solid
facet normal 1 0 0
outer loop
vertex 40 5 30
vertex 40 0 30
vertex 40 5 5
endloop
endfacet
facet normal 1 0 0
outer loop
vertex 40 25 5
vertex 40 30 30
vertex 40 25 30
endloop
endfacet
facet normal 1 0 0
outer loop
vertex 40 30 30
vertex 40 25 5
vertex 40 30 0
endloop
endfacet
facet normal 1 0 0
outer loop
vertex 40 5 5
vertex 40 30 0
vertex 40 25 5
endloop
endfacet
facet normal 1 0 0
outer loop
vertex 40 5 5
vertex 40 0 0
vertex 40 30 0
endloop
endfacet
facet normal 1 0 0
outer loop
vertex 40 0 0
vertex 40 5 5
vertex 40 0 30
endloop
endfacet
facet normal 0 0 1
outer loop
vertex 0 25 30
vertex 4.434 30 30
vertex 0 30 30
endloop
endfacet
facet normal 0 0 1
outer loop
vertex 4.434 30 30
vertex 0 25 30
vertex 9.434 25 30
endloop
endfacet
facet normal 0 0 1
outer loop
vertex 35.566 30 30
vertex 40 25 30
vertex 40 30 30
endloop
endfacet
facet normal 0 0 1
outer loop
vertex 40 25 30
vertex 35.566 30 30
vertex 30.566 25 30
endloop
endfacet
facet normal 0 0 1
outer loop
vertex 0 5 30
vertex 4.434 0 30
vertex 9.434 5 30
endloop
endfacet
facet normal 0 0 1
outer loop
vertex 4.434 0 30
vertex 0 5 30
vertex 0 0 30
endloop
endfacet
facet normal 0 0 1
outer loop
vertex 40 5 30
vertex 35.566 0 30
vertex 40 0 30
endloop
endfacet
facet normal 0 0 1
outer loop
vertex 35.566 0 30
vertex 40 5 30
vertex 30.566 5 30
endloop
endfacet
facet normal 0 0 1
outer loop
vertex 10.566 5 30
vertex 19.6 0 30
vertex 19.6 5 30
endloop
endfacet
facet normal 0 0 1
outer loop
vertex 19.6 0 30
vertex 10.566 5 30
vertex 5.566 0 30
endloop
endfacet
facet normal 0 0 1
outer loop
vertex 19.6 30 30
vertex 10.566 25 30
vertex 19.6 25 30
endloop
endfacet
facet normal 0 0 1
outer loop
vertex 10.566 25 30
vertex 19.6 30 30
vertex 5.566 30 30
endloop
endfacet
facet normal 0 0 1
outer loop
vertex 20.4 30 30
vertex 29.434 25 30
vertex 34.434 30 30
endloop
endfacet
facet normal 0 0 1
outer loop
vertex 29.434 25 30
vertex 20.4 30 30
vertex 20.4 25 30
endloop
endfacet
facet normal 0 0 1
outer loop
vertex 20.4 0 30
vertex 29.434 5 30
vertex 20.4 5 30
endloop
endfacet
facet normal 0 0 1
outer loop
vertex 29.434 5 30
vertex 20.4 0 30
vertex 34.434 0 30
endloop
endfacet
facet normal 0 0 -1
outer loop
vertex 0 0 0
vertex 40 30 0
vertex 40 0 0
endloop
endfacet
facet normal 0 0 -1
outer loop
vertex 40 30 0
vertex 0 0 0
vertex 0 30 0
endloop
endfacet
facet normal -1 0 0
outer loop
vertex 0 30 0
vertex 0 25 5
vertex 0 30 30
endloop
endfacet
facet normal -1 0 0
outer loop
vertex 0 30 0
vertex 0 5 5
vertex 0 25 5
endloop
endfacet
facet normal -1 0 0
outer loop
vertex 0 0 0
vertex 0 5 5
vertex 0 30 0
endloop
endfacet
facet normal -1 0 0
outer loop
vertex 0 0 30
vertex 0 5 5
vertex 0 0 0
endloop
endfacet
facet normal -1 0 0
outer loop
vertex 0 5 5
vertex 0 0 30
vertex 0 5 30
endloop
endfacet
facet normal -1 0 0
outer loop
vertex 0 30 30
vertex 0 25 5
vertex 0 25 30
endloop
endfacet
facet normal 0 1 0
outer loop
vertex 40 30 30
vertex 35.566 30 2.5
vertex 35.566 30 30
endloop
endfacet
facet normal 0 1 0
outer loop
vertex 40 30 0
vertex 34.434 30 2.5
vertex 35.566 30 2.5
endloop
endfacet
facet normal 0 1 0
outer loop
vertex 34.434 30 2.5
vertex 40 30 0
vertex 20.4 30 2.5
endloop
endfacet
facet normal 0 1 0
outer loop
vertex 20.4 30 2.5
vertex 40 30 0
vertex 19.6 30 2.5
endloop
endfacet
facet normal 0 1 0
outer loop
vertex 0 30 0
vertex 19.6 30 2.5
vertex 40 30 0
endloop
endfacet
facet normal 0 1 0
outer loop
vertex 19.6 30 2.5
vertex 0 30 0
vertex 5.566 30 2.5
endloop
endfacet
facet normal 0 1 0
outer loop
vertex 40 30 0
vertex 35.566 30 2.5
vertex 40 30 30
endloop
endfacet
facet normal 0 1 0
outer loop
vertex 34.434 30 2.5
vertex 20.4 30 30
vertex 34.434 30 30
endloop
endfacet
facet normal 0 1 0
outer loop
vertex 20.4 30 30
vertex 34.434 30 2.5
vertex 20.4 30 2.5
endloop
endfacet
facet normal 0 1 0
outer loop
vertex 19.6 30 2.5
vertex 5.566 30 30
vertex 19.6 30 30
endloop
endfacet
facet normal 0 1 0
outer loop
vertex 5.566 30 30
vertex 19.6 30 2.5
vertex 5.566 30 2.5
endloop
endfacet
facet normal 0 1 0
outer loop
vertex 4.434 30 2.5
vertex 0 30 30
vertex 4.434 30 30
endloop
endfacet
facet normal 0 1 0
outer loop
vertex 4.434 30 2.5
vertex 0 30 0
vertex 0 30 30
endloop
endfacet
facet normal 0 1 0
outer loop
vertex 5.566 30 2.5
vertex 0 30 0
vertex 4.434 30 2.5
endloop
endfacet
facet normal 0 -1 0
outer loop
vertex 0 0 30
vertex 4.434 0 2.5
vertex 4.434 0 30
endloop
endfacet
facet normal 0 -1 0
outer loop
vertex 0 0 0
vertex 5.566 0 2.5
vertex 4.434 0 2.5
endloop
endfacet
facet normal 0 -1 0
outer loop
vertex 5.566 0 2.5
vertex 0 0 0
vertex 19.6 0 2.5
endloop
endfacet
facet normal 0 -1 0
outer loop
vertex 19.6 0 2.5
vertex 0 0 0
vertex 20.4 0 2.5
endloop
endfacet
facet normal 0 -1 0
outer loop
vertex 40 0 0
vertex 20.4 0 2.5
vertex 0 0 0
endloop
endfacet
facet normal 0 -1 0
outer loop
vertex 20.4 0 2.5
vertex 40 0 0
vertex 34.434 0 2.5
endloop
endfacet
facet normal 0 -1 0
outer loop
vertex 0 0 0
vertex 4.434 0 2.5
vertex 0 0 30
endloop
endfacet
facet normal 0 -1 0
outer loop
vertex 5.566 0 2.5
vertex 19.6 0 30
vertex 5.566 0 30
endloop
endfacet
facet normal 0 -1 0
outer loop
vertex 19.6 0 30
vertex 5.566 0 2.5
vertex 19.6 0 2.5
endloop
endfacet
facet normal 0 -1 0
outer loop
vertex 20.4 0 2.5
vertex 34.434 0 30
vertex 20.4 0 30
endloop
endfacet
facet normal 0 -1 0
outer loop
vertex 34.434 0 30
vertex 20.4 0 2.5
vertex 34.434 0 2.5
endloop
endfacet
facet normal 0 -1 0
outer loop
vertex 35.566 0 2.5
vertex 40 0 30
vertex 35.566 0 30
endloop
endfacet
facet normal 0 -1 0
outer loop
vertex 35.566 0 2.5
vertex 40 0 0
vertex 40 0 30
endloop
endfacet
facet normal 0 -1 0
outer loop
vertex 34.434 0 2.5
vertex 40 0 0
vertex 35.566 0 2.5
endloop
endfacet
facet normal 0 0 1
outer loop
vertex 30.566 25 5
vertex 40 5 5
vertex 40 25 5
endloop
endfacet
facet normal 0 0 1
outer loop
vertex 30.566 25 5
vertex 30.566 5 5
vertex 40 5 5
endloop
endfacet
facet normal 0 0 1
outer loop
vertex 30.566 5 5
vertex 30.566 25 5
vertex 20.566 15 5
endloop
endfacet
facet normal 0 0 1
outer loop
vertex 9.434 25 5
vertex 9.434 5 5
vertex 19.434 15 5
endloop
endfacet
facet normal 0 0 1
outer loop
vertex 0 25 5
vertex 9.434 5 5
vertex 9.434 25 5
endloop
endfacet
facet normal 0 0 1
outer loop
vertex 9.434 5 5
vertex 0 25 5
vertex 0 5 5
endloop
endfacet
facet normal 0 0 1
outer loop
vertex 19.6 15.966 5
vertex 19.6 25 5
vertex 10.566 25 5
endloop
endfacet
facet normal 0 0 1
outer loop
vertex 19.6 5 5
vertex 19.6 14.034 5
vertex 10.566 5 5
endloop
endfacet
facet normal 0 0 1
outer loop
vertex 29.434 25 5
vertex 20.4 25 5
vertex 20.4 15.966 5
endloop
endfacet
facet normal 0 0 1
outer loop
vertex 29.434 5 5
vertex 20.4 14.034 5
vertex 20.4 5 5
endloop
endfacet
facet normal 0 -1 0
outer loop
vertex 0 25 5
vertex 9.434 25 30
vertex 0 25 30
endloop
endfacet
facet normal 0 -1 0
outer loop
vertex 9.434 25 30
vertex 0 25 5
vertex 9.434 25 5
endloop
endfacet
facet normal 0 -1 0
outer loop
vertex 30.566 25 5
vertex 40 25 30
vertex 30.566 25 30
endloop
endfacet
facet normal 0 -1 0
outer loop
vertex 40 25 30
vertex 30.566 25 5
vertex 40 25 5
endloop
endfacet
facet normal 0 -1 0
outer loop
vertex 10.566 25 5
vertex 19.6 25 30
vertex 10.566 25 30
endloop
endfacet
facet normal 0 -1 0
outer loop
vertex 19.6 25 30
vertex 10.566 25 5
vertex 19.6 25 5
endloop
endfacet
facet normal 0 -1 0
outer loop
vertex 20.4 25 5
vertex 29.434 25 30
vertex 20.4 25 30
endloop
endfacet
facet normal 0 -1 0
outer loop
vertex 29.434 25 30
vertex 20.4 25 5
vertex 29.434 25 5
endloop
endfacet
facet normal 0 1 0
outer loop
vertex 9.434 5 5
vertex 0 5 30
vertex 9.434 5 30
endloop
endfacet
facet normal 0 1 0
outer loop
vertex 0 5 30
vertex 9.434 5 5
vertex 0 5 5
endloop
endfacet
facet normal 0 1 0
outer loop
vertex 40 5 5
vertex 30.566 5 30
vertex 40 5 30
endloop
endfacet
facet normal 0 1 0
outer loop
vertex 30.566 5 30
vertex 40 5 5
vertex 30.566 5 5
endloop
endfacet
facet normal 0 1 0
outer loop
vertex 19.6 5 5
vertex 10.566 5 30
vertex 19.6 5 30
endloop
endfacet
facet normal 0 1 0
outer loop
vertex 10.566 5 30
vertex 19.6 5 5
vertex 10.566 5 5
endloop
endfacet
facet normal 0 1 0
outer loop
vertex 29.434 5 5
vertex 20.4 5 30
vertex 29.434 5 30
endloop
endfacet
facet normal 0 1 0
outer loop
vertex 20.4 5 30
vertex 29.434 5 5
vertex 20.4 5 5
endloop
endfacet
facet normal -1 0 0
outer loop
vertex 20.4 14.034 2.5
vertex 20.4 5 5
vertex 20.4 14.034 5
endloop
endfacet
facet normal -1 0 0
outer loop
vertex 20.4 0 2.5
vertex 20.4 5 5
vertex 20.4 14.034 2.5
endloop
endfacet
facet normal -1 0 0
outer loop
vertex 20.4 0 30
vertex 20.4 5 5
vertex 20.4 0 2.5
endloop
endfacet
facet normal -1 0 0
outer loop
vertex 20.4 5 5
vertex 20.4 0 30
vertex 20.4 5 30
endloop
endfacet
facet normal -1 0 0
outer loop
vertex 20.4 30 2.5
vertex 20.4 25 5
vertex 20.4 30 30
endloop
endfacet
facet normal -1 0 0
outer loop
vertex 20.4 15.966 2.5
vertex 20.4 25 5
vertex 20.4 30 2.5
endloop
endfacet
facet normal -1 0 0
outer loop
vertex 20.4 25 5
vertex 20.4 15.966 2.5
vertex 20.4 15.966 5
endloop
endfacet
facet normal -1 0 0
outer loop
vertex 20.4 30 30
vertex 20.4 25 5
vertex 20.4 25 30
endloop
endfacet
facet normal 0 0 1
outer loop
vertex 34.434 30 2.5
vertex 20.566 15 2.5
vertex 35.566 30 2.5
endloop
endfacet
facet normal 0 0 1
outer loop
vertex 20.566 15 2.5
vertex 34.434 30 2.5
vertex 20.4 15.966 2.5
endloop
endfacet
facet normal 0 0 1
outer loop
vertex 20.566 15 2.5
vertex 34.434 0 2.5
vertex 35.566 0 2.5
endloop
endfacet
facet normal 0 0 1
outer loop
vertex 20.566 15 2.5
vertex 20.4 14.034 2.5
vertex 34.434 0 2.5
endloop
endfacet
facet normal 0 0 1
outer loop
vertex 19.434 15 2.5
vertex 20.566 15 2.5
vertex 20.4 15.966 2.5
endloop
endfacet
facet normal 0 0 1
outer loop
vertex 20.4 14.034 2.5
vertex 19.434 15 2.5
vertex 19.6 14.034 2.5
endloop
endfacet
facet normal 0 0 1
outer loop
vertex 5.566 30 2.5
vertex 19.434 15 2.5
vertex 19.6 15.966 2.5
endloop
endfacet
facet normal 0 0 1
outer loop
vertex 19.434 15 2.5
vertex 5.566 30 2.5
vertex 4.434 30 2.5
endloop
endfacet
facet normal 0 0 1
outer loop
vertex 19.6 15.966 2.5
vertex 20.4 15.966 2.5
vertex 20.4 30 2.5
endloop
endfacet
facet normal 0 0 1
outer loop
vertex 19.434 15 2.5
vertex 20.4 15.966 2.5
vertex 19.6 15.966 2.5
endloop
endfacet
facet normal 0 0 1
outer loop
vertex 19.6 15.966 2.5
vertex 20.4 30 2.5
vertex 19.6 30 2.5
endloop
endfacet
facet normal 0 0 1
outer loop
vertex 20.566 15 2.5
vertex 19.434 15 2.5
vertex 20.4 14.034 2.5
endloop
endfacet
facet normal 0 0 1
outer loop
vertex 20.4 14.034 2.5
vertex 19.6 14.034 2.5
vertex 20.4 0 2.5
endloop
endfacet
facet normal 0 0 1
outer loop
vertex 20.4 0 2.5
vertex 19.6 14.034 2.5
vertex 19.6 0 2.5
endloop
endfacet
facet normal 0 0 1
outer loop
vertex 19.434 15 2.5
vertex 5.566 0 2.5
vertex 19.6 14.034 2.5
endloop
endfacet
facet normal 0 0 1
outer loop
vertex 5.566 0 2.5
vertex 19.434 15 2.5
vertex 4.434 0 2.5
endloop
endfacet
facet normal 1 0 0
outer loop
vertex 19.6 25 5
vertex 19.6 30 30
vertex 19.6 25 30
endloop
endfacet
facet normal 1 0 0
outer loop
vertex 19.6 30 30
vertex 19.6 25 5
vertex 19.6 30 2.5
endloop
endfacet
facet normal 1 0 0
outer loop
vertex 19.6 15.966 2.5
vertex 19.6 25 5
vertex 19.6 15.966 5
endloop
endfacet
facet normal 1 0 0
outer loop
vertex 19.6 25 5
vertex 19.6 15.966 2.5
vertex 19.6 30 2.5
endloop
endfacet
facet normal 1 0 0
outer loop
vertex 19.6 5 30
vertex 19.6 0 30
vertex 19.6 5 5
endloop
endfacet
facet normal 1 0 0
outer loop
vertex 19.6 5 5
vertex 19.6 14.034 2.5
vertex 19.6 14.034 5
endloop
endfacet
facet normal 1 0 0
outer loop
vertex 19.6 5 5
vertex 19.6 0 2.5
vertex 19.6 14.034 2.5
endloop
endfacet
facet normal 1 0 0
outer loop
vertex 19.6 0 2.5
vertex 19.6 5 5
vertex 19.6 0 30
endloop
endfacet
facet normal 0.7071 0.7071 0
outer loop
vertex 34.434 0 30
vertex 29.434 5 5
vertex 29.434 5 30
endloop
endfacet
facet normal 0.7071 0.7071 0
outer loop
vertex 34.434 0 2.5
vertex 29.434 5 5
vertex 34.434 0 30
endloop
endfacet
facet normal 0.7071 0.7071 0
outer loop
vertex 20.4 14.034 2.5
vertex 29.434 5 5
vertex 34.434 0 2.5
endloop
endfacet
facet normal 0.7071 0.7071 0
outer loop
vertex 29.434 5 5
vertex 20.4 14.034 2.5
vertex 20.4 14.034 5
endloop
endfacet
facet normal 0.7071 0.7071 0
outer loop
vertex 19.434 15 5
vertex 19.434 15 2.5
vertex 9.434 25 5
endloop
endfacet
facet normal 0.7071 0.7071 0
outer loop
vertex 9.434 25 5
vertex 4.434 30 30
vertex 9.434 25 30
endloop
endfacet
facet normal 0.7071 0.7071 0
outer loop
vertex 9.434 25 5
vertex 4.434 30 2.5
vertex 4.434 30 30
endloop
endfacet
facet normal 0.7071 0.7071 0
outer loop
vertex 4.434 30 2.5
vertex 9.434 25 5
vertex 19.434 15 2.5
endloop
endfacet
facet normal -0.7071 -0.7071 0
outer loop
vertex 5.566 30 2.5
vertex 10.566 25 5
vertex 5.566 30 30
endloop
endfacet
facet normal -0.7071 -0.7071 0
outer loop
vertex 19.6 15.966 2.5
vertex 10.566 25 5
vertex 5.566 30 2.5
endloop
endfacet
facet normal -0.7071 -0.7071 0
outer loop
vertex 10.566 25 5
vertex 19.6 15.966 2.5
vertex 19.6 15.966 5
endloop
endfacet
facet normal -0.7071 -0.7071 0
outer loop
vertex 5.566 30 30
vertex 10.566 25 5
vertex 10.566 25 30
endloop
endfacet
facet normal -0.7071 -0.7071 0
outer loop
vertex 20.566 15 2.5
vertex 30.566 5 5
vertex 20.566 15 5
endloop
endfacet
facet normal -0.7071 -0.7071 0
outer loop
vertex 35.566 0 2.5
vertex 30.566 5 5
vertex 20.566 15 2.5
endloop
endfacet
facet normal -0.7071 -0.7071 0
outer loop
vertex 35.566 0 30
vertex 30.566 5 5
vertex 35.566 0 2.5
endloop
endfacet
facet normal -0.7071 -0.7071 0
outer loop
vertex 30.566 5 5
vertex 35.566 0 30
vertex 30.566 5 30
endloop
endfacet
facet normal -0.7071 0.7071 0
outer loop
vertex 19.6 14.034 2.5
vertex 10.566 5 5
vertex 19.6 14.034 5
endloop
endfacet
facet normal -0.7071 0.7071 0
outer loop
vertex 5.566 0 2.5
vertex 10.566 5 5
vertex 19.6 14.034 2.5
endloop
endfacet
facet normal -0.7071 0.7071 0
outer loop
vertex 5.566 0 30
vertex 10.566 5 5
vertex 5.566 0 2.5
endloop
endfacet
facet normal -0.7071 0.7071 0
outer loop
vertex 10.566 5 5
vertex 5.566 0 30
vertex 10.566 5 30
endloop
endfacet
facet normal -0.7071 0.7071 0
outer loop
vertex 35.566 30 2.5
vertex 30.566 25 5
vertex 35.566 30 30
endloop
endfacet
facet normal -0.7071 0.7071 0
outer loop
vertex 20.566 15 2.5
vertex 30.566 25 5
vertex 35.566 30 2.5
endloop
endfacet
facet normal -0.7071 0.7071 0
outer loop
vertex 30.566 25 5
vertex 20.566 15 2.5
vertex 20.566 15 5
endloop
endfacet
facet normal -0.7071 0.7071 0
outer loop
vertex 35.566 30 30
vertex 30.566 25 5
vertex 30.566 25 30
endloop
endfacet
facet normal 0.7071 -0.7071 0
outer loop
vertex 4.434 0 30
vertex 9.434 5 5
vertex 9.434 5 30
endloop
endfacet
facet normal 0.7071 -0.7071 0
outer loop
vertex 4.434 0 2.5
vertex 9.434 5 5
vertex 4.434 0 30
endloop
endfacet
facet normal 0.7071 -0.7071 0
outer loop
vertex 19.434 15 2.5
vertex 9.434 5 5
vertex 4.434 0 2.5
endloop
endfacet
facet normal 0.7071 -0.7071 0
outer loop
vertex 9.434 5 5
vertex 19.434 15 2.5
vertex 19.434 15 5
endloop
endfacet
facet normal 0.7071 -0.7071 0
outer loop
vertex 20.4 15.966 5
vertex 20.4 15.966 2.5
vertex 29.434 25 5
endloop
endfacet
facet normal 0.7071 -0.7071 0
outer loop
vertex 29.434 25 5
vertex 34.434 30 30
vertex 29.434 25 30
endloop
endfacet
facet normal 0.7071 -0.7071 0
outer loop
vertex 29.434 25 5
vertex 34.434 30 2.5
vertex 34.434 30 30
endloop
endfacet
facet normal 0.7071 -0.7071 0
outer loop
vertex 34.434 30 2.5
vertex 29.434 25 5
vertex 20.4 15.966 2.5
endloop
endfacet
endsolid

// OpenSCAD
// Zach Arnold
// MSE4777 Miter Box
// Customizable material sizes and angle of cut

bladeWidth = 0.8; //Put saw blade width here
materialHeight = 20; //Height of the material
materialWidth = 20; //Width of the material
cutAngle = 45; //Between 60* and 0*
miterBoxLength = 40; //Change the length to make the cuts fit
cutAngle2 = 90;

difference ()
{
    miterBox();
    bladePosition();
}

module material ()
{
    cube([miterBoxLength, materialWidth, materialHeight+5]);
}

module miterBox ()
{
    difference ()
    {
        cube([miterBoxLength, materialWidth + 10, materialHeight + 10]);
        translate([0,5,5])
            material();
    }
}

module blade ()
{
    cube([bladeWidth, materialWidth + 100, materialHeight + 7.5], center = true);
}

module bladePosAngle ()
{
    rotate([0,0,cutAngle])
        blade();
}

module bladeNegAngle ()
{
    rotate([0,0,-cutAngle])
        blade();
}

module bladePosition ()
{
    translate([miterBoxLength/2,(materialWidth + 10)/2,((materialHeight+7.5)/2)+2.5])
        blade();
 
    translate([(miterBoxLength/2),(materialWidth + 10)/2,((materialHeight+7.5)/2)+2.5])
        bladePosAngle();
    
    translate([(miterBoxLength/2),(materialWidth + 10)/2,((materialHeight+7.5)/2)+2.5])
        bladeNegAngle();
}
